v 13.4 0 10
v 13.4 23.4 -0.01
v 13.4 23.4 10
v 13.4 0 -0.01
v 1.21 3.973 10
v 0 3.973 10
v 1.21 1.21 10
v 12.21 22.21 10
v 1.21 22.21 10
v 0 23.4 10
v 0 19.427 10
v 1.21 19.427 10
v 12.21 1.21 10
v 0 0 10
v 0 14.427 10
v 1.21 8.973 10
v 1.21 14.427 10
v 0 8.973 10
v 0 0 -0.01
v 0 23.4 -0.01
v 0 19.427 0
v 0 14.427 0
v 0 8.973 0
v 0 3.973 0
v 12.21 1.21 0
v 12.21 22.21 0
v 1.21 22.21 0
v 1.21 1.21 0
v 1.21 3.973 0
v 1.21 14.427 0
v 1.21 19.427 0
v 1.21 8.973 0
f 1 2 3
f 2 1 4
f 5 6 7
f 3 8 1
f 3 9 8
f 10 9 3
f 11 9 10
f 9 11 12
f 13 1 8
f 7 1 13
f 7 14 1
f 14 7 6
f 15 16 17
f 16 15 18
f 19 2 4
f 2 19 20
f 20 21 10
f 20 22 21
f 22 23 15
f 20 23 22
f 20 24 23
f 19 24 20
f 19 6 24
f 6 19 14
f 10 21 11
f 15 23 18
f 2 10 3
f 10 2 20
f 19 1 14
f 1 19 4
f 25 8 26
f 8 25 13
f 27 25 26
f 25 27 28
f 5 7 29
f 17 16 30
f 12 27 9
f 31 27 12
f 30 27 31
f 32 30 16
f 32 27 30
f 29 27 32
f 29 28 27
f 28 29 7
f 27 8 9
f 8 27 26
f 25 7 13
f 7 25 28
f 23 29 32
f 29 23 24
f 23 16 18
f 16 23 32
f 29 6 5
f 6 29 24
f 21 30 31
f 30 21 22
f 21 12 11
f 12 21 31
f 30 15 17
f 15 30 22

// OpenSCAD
// file: ../../Base/Rotation.scad
// Fischertechnik Box Foundation
// Geometry Helpers Rotation

include <PlacementOptions.scad>

// getRotatedSpace(space, rotation=NoRotation)
// Rotates the space dependent on the specified rotation

function getRotatedSpace(space, rotation=NoRotation) = [
    (rotation == Rotate90 || rotation == Rotate270) ? space.y : space.x,
    (rotation == Rotate90 || rotation == Rotate270) ? space.x : space.y
];

// Rotates the given space around the fixed left lower corner
// space = the space the children needs as width/depth list [width,depth]
// rotation = 0 Rotate0 degrees, 1 Rotate90 degrees, 2 Rotate180 degrees, 3 Rotate270 degrees (equivalent to -90)

module RotateFix(space, rotation=NoRotation) {
    dy = (rotation == Rotate0 || rotation == Rotate270) ? 0 :
        (rotation == Rotate90) ? space.x :
        space.y;
    dx = (rotation < Rotate180) ? 0 :
        (rotation == Rotate180) ? space.x :
        space.y;
    
    translate([dx, dy, 0])
        rotate([0, 0, rotations[rotation]])
            children();
}
// file: ../../Base/Alignment.scad
// Fischertechnik Box Foundation
// Geometry Helpers Alignment

include <PlacementOptions.scad>

// getAlignedX(elementWidth, spaceWidth, align=AlignRight, offset=0)
// Gets the aligned X offset of an element with the given
// width in the given space.
// elementWidth = The width of the element to positon
// spaceWidth = The space where the element should be aligned
// align = 0 AlignLeft, 1 AlignCenter, 2 AlignRight
// offset = an optional offset from the aligned position. When
// aligned left or centered, then positive values are in X direction.
// When aligned right then positive values are in negative X direction.

function getAlignedX(elementWidth, spaceWidth, align=AlignRight, offset=0) =
    (align == AlignLeft) ?
        offset :
        ((align == AlignCenter) ?
        (spaceWidth - elementWidth)/2 + offset :
        spaceWidth - offset - elementWidth);

// getAlignedY(elementDepth, spaceDepth, align=AlignTop, offset=0)
// Gets the aligned Y offset of an element with the given
// depth in the given space.
// elementDepth = The depth of the element to positon
// spaceDepth = The space where the element should be aligned
// align = 0 AlignBottom, 1 AlignCenter, 2 AlignTop
// offset = an optional offset from the aligned position. When
// aligned bottom or centered, then positive values are in Y direction.
// When aligned top then positive values are in negative Y direction.

function getAlignedY(elementDepth, spaceDepth, align=AlignTop, offset=0) =
    (align == AlignBottom) ?
        offset :
        ((align == AlignCenter) ?
        (spaceDepth - elementDepth)/2 + offset :
        spaceDepth - offset - elementDepth);
// file: ../../Base/PlacementOptions.scad
// Fischertechnik Box Foundation
// Placement Options

// Alignment
NoAlign = 0;
AlignLeft = 1;
AlignBottom = 2;
AlignCenter = 3;
AlignRight = 4;
AlignTop = 5;

// Element rotation degree steps
rotations = [0, -90, -180, -270];

// Rotation
NoRotation = 0;
Rotate0 = 0;
Rotate90 = 1;
Rotate180 = 2;
Rotate270 = 3;

// Docking (seen from above)
NoDock = -1;
DockLeft = 0;
DockTop = 1;
DockRight = 2;
DockCorner = 2;
DockBottom = 3;

// Web corners
LowerLeft = 0;
UpperLeft = 1;
UpperRight = 2;
LowerRight = 3;

// Web position relative to corner
LeftOfCorner = 0;
RightOfCorner = 1;

// Rails direction
Horizontal = true;
Vertical = false;
// file: ../../Base/Boxes.scad
// Fischertechnik Box Foundation
// Pre-designed Boxes

use <Constants.scad>

include <PlacementOptions.scad>

box190Width = 190;
box190Depth = 130;
box130Width = 130;
box130Depth = 95;

// Values are from an original ec3 box
topBottomDifference = 1.5;
outerHeight = 40;
baseThickness = 1.8;
innerHeight = outerHeight - baseThickness;
stackExcess = 5.7;
radius = 3.5;
wallThickness = 1.5;
tolerance = 0.2;

boxWallThickness = wallThickness;
boxBaseThickness = baseThickness;
boxWebWidth = 3.0;

// getBoxWallThickness()
// Gets the wall thickness of a Fischertechnik Box
function getBoxWallThickness() = boxWallThickness;

// getBoxUsageHeight(height = 38.2)
// Gets the usable height of a Fischertechnik box
// height = Outer height of the box from the bottom to the upper edge.
function getBoxUsageHeight(height = outerHeight) = height - baseThickness - stackExcess;

// getBoxInnerHeight()
// Gets the inner height of a Fischertechnik box, including the stack excess
function getBoxInnerHeight() = innerHeight;

// getBoxBaseThickness()
// Gets the thickness of the Fischertechnik box base.
function getBoxBaseThickness() = boxBaseThickness;

// getBoxWebWidth()
// Gets the width of a box web
function getBoxWebWidth() = boxWebWidth;

// getBox190Space()
// Gets the usable inner space of a Box 190 as an x/y-list
function getBox190Space() = [
    box190Width - 2*getBoxWallThickness() - topBottomDifference, 
    box190Depth - 2*getBoxWallThickness() - topBottomDifference ];

// RoundedCornerPlate(width, depth, height, radius)
// Creates a body plate with rounded corners for a box. Used
// also to create the complete box with the hull module.
// width = Width of the plate
// depth = depth of the plate 
// height = thickness of the plate
// radius = radius of the rounded corner
module RoundedCornerPlate(width, depth, height, radius) {
    translate([radius, radius])
    hull() {
        w = width-2*radius;
        d = depth-2*radius;
        cube([w, d, height]);
        cylinder(height, r=radius, $fn=getFragments());
        translate([w, 0])
            cylinder(height, r=radius, $fn=getFragments());
        translate([w, d])
            cylinder(height, r=radius, $fn=getFragments());
        translate([0, d])
            cylinder(height, r=radius, $fn=getFragments());
    }
}

// BoxBase(width, depth)
// Creates an empty stackable Fischertechnik compatible box
// width = Outer width of the box (190, 130, ...)
// depth = Outer depth of the box (130, 95, ...)

module BoxBase(width, depth, height=outerHeight) {    
    thinPlate = 0.01;

    innerHeight = height - baseThickness;    
    
    module Body(tolerance=tolerance) {
        hull() {
            // Bottom with tolerance to fit into the original boxes when stacked
            translate([-wallThickness+tolerance, -wallThickness+tolerance, -baseThickness])
                RoundedCornerPlate(width-topBottomDifference-2*tolerance, depth-topBottomDifference-2*tolerance, thinPlate, radius);
            
            // Top
            translate([-wallThickness-topBottomDifference/2, -wallThickness-topBottomDifference/2, innerHeight-thinPlate])
                RoundedCornerPlate(width, depth, thinPlate, radius);
         }
    }

    module Cutoff() {
        hull() {
            coWidth = width - 2*wallThickness;
            coDepth = depth - 2*wallThickness;
            
            // Bottom
            RoundedCornerPlate(coWidth-topBottomDifference, coDepth-topBottomDifference, thinPlate, radius);

            // Top
            translate([-topBottomDifference/2, -topBottomDifference/2, innerHeight+thinPlate]) 
                RoundedCornerPlate(coWidth, coDepth, thinPlate, radius);
        }
    }
    
    difference() {        
        Body();
        Cutoff();
        stackOffset = innerHeight - stackExcess;
        translate([0, 0, stackOffset + baseThickness])
            Body(tolerance=0);
    }
}

// Creates the Fischertechnik empty box 130x190 mm and places it at position 0,0
// 190x130 are the outer sizes, the inner space is slightly smaller. Use getBox190Space() to get the inner sizes.
// The box is positioned that the usable inner space is at the 0,0,0 position.

module Box190() {
    BoxBase(box190Width, box190Depth);
}

// Gets the usable inner space of a Box 130 as an x/y-list
function getBox130Space() = [
    box130Width - 2*getBoxWallThickness() - topBottomDifference, 
    box130Depth - 2*getBoxWallThickness() - topBottomDifference ];

// Creates the Fischertechnik empty box 95x130 mm and places it at position 0,0
// 190x130 are the outer sizes, the inner space is slightly smaller. Use getBox190Space() to get the inner sizes.
// The box is positioned that the usable inner space is at the 0,0,0 position.

module Box130() {
    BoxBase(box130Width, box130Depth);
}

// Creates a web at the specified box walls
// corner 0 = LowerLeft, 1 = UpperLeft, 2 = UpperRight, 3 = LowerRight
// side 0 = LeftOfCorner, 1 = RightOfCorner
// distance = Distance in mm from the corner
// boxSpace = inner width and depth of the box (default: Box 190)
// webWidth = length of the web (default is 3 mms)
// webThickness = thickness of the web (default is 1 mm)
// height = Height of the web (standard is getBoxUsageHeight())
// sink = How much of the web is sunk into the wall

module BoxWeb(
    corner, 
    side, 
    distance, 
    boxSpace=getBox190Space(), 
    webWidth=getBoxWebWidth(), 
    webThickness=1.0, 
    height=getBoxUsageHeight(),
    sink = getBoxWallThickness()/2) {
    width = (corner % 2 == 0) ? 
            (side == LeftOfCorner ? webWidth : webThickness) :
            (side == LeftOfCorner ? webThickness : webWidth);

    depth = (corner % 2 == 0) ? 
            (side == RightOfCorner ? webWidth : webThickness) :
            (side == RightOfCorner ? webThickness : webWidth);
    
    xDiff = corner == LowerLeft ? 
                (side == LeftOfCorner ? -sink : distance) :
            (corner == UpperLeft ?                
                (side == LeftOfCorner ? distance : -sink) :
            (corner == UpperRight ?
                (side == LeftOfCorner ? boxSpace.x-webWidth+sink : boxSpace.x-distance-webThickness) :
                (side == LeftOfCorner ? boxSpace.x-distance-webThickness: boxSpace.x-webWidth+sink)));

    yDiff = corner == LowerLeft ? 
                (side == RightOfCorner ? -sink : distance) :
            (corner == UpperLeft ?
                (side == RightOfCorner ? boxSpace.y-distance-webThickness : boxSpace.y-webWidth+sink) :
            (corner == UpperRight ?
                (side == RightOfCorner ? boxSpace.y-webWidth+sink : boxSpace.y-distance-webThickness) :
                (side == RightOfCorner ? distance : -sink)));
    
    translate([xDiff, yDiff, -getExcess()])
        cube([width, depth, height + 2*getExcess()]);
}
// file: ../../Base/Placement.scad
// Fischertechnik Box Foundation
// Geometry Helpers Placement

use <Constants.scad>
use <Alignment.scad>
use <Rotation.scad>
use <Boxes.scad>

include <PlacementOptions.scad>

// Place(x=0, y=0, elementSpace=[0,0], alignX=AlignLeft, alignY=AlignBottom, rotation=Rotate0, boxSpace=getBox190Space())
// Places the child at the specified position
// y = Y-Position. This is a relative position when an X aligment is specified.
// x = X-Position. This is a relative position when an Y aligment is specified.
// elementSpace = space of the element to be placed [x,y]
// alignX = -1=NoAlign, 0 AlignLeft, 1 AlignCenter, 3 AlignRight (elementSpace and boxSpace required!)
// alignY = -1=NoAlign, 2 AlignBottom, 1 AlignCenter, 4 AlignTop (elementSpace and boxSpace required!)
// rotation = 0 Rotate0 0 degrees, 1 Rotate90 90 degrees, 
// 2 Rotate180 180 degrees, 3 Rotate270 270 degrees (equivalent to -90)
// boxSpace = Inner space of the box where the placement occurs [x,y] - default is Box 190x130 inner space

module Place(x=0, y=0, elementSpace=[0,0], 
  alignX=AlignLeft, alignY=AlignBottom, 
  rotation=NoRotation, boxSpace=getBox190Space()) {

    module Position(x, y, space, rotation=Rotate0) {
        translate([x, y, 0])
            RotateFix(space, rotation)
                children();
    }

    space = getRotatedSpace(elementSpace, rotation);
    alignedX = getAlignedX(space.x, boxSpace.x, alignX, x);
    alignedY = getAlignedY(space.y, boxSpace.y, alignY, y);
    Position(alignedX, alignedY, elementSpace, rotation)
        children();
}

// Center(space=getBox130Space(), elementSpace=[0,0])
// space = Space where the children is centered. For cylinder use centered=true and no elementSpace.
// elementSpace = space of the element to be centered [x,y]

module Center(space=getBox190Space(), elementSpace=[0,0]) {
    Place(elementSpace=elementSpace, boxSpace=space, alignX=AlignCenter, alignY=AlignCenter)
        children();
}

// CenterHorizontal(width=0, y=0, offset=0, space=getBox130Space())
// width = Width of the element to be placed.
// y = Y position of the element
// offset = Offset from the center position (negative will be left of the center)
// space = Space where the element is placed

module CenterHorizontal(width=0, y=0, offset=0, space=getBox190Space()) {
    Place(x=offset, y=y, elementSpace=[width, 0], boxSpace=space, alignX=AlignCenter)
        children(0);
}

// CenterVertical(depth=0, x=0, offset=0, space=getBox130Space())
// depth = Depth of the element to be placed.
// x = X position of the element
// offset = Offset from the center position (negative will be down of the center)
// space = Space where the element is placed

module CenterVertical(depth=0, x=0, offset=0, space=getBox190Space()) {
    Place(x=x, y=offset, elementSpace=[0, depth], boxSpace=space, alignY=AlignCenter)
        children(0);
}

// getIsVertical(align)
// True if the specified alignment needs a vertical orientation for a divider (AlignRight, AlignLeft)

function getIsVertical(align) = (align == AlignRight || align == AlignLeft);

// getIsHorizontal(align)
// True if the specified alignment needs a horizontal orientation for a divider (AlignTop, AlignBottom)

function getIsHorizontal(align) = (align == AlignTop || align == AlignBottom);
// file: ../../Base/Constants.scad
// Fischertechnik Box Foundation
// Constants

// Constant values necessary for multiple elements

// Base constants
dividerThickness = 1.2;
excess = 0.01;
fragments = 90;
tolerance = 0.8;

// Gets the thickness of a divider 
function getDividerThickness() = dividerThickness;

// Gets the excess that is used to merge walls into each other
function getExcess() = excess;

// Gets amount of fragments of a cylinder
function getFragments() = fragments;

// Gets the inner tolerance of a frame to each side
function getTolerance() = tolerance;


// Fischertechnik specific constants
axisDiameter = 4;
axisBottomDiameter = axisDiameter + 1;
axisTolerance = 0.2;
axisLockingLength = 8;

// Gets axis diameter of Fischertechnik axis
function getAxisDiameter() = axisDiameter;

// Gets axis diameter tolerance (subtracted for element axis)
function getAxisTolerance() = axisTolerance;

// Gets the axis diameter for standing axis
function getStandAxisDiameter() = getAxisDiameter() - getAxisTolerance();

// Gets axis bottom diameter for thicker part at the bottom
function getAxisBottomDiameter() = axisBottomDiameter;

// Gets the lengthh of the locking part of a locking axis
function getAxisLockingLength() = axisLockingLength;

pinHeight = 2.5;
pinTolerance = 0.2;

// gets the height of a connecting pin
function getPinHeight() = pinHeight;

// gets the connecting pin height tolerance
function getPinTolerance() = pinTolerance;

standardEdgeDistance = 2.5;
standardWebDistance = 11.5;
standardCornerLength = 15;

// gets the standard distance to the wall of the box for dockable frames with webs
function getStandardEdgeDistance() = standardEdgeDistance;

// gets the standard distance of each web to the corner of the dockable frame
function getStandardWebDistance() = standardWebDistance;

// gets the standard length of the corner walls of a dockable frame
function getStandardCornerLength() = standardCornerLength;

tubeWallFactor = 0.8;

// gets the wall thickness of a tube.
function getTubeWallThickness() = tubeWallFactor * getDividerThickness();

smallPartsFrameHeight = 20;

// gets the frame height for docked small parts boxes.
function getSmallPartsFrameHeight() = smallPartsFrameHeight;

hubRingDiameter = 19.5;
hubRingLevelDiameter = 21;

// gets the diameter of a tube matching the inner ring of a wheel
function getHubRingDiameter() = hubRingDiameter;

// gets the diameter of a hub tube with a thicker diameter
function getHubRingLevelDiameter() = hubRingLevelDiameter;
// main file
// Fischertechnik Box Foundation
// ModelBase
// Test FrameLeftCutoffs

use <../../Base/Constants.scad>
use <../../ModelBase/Simple.scad>

depth = 10;
count = 2;
cutoffWidth = 5;
tolerance = 1;

difference() {
    volume = [10, depth * count, 10];
    Frame(volume, tolerance);
    FrameLeftCutoffs(volume, count, cutoffWidth, tolerance);
}
